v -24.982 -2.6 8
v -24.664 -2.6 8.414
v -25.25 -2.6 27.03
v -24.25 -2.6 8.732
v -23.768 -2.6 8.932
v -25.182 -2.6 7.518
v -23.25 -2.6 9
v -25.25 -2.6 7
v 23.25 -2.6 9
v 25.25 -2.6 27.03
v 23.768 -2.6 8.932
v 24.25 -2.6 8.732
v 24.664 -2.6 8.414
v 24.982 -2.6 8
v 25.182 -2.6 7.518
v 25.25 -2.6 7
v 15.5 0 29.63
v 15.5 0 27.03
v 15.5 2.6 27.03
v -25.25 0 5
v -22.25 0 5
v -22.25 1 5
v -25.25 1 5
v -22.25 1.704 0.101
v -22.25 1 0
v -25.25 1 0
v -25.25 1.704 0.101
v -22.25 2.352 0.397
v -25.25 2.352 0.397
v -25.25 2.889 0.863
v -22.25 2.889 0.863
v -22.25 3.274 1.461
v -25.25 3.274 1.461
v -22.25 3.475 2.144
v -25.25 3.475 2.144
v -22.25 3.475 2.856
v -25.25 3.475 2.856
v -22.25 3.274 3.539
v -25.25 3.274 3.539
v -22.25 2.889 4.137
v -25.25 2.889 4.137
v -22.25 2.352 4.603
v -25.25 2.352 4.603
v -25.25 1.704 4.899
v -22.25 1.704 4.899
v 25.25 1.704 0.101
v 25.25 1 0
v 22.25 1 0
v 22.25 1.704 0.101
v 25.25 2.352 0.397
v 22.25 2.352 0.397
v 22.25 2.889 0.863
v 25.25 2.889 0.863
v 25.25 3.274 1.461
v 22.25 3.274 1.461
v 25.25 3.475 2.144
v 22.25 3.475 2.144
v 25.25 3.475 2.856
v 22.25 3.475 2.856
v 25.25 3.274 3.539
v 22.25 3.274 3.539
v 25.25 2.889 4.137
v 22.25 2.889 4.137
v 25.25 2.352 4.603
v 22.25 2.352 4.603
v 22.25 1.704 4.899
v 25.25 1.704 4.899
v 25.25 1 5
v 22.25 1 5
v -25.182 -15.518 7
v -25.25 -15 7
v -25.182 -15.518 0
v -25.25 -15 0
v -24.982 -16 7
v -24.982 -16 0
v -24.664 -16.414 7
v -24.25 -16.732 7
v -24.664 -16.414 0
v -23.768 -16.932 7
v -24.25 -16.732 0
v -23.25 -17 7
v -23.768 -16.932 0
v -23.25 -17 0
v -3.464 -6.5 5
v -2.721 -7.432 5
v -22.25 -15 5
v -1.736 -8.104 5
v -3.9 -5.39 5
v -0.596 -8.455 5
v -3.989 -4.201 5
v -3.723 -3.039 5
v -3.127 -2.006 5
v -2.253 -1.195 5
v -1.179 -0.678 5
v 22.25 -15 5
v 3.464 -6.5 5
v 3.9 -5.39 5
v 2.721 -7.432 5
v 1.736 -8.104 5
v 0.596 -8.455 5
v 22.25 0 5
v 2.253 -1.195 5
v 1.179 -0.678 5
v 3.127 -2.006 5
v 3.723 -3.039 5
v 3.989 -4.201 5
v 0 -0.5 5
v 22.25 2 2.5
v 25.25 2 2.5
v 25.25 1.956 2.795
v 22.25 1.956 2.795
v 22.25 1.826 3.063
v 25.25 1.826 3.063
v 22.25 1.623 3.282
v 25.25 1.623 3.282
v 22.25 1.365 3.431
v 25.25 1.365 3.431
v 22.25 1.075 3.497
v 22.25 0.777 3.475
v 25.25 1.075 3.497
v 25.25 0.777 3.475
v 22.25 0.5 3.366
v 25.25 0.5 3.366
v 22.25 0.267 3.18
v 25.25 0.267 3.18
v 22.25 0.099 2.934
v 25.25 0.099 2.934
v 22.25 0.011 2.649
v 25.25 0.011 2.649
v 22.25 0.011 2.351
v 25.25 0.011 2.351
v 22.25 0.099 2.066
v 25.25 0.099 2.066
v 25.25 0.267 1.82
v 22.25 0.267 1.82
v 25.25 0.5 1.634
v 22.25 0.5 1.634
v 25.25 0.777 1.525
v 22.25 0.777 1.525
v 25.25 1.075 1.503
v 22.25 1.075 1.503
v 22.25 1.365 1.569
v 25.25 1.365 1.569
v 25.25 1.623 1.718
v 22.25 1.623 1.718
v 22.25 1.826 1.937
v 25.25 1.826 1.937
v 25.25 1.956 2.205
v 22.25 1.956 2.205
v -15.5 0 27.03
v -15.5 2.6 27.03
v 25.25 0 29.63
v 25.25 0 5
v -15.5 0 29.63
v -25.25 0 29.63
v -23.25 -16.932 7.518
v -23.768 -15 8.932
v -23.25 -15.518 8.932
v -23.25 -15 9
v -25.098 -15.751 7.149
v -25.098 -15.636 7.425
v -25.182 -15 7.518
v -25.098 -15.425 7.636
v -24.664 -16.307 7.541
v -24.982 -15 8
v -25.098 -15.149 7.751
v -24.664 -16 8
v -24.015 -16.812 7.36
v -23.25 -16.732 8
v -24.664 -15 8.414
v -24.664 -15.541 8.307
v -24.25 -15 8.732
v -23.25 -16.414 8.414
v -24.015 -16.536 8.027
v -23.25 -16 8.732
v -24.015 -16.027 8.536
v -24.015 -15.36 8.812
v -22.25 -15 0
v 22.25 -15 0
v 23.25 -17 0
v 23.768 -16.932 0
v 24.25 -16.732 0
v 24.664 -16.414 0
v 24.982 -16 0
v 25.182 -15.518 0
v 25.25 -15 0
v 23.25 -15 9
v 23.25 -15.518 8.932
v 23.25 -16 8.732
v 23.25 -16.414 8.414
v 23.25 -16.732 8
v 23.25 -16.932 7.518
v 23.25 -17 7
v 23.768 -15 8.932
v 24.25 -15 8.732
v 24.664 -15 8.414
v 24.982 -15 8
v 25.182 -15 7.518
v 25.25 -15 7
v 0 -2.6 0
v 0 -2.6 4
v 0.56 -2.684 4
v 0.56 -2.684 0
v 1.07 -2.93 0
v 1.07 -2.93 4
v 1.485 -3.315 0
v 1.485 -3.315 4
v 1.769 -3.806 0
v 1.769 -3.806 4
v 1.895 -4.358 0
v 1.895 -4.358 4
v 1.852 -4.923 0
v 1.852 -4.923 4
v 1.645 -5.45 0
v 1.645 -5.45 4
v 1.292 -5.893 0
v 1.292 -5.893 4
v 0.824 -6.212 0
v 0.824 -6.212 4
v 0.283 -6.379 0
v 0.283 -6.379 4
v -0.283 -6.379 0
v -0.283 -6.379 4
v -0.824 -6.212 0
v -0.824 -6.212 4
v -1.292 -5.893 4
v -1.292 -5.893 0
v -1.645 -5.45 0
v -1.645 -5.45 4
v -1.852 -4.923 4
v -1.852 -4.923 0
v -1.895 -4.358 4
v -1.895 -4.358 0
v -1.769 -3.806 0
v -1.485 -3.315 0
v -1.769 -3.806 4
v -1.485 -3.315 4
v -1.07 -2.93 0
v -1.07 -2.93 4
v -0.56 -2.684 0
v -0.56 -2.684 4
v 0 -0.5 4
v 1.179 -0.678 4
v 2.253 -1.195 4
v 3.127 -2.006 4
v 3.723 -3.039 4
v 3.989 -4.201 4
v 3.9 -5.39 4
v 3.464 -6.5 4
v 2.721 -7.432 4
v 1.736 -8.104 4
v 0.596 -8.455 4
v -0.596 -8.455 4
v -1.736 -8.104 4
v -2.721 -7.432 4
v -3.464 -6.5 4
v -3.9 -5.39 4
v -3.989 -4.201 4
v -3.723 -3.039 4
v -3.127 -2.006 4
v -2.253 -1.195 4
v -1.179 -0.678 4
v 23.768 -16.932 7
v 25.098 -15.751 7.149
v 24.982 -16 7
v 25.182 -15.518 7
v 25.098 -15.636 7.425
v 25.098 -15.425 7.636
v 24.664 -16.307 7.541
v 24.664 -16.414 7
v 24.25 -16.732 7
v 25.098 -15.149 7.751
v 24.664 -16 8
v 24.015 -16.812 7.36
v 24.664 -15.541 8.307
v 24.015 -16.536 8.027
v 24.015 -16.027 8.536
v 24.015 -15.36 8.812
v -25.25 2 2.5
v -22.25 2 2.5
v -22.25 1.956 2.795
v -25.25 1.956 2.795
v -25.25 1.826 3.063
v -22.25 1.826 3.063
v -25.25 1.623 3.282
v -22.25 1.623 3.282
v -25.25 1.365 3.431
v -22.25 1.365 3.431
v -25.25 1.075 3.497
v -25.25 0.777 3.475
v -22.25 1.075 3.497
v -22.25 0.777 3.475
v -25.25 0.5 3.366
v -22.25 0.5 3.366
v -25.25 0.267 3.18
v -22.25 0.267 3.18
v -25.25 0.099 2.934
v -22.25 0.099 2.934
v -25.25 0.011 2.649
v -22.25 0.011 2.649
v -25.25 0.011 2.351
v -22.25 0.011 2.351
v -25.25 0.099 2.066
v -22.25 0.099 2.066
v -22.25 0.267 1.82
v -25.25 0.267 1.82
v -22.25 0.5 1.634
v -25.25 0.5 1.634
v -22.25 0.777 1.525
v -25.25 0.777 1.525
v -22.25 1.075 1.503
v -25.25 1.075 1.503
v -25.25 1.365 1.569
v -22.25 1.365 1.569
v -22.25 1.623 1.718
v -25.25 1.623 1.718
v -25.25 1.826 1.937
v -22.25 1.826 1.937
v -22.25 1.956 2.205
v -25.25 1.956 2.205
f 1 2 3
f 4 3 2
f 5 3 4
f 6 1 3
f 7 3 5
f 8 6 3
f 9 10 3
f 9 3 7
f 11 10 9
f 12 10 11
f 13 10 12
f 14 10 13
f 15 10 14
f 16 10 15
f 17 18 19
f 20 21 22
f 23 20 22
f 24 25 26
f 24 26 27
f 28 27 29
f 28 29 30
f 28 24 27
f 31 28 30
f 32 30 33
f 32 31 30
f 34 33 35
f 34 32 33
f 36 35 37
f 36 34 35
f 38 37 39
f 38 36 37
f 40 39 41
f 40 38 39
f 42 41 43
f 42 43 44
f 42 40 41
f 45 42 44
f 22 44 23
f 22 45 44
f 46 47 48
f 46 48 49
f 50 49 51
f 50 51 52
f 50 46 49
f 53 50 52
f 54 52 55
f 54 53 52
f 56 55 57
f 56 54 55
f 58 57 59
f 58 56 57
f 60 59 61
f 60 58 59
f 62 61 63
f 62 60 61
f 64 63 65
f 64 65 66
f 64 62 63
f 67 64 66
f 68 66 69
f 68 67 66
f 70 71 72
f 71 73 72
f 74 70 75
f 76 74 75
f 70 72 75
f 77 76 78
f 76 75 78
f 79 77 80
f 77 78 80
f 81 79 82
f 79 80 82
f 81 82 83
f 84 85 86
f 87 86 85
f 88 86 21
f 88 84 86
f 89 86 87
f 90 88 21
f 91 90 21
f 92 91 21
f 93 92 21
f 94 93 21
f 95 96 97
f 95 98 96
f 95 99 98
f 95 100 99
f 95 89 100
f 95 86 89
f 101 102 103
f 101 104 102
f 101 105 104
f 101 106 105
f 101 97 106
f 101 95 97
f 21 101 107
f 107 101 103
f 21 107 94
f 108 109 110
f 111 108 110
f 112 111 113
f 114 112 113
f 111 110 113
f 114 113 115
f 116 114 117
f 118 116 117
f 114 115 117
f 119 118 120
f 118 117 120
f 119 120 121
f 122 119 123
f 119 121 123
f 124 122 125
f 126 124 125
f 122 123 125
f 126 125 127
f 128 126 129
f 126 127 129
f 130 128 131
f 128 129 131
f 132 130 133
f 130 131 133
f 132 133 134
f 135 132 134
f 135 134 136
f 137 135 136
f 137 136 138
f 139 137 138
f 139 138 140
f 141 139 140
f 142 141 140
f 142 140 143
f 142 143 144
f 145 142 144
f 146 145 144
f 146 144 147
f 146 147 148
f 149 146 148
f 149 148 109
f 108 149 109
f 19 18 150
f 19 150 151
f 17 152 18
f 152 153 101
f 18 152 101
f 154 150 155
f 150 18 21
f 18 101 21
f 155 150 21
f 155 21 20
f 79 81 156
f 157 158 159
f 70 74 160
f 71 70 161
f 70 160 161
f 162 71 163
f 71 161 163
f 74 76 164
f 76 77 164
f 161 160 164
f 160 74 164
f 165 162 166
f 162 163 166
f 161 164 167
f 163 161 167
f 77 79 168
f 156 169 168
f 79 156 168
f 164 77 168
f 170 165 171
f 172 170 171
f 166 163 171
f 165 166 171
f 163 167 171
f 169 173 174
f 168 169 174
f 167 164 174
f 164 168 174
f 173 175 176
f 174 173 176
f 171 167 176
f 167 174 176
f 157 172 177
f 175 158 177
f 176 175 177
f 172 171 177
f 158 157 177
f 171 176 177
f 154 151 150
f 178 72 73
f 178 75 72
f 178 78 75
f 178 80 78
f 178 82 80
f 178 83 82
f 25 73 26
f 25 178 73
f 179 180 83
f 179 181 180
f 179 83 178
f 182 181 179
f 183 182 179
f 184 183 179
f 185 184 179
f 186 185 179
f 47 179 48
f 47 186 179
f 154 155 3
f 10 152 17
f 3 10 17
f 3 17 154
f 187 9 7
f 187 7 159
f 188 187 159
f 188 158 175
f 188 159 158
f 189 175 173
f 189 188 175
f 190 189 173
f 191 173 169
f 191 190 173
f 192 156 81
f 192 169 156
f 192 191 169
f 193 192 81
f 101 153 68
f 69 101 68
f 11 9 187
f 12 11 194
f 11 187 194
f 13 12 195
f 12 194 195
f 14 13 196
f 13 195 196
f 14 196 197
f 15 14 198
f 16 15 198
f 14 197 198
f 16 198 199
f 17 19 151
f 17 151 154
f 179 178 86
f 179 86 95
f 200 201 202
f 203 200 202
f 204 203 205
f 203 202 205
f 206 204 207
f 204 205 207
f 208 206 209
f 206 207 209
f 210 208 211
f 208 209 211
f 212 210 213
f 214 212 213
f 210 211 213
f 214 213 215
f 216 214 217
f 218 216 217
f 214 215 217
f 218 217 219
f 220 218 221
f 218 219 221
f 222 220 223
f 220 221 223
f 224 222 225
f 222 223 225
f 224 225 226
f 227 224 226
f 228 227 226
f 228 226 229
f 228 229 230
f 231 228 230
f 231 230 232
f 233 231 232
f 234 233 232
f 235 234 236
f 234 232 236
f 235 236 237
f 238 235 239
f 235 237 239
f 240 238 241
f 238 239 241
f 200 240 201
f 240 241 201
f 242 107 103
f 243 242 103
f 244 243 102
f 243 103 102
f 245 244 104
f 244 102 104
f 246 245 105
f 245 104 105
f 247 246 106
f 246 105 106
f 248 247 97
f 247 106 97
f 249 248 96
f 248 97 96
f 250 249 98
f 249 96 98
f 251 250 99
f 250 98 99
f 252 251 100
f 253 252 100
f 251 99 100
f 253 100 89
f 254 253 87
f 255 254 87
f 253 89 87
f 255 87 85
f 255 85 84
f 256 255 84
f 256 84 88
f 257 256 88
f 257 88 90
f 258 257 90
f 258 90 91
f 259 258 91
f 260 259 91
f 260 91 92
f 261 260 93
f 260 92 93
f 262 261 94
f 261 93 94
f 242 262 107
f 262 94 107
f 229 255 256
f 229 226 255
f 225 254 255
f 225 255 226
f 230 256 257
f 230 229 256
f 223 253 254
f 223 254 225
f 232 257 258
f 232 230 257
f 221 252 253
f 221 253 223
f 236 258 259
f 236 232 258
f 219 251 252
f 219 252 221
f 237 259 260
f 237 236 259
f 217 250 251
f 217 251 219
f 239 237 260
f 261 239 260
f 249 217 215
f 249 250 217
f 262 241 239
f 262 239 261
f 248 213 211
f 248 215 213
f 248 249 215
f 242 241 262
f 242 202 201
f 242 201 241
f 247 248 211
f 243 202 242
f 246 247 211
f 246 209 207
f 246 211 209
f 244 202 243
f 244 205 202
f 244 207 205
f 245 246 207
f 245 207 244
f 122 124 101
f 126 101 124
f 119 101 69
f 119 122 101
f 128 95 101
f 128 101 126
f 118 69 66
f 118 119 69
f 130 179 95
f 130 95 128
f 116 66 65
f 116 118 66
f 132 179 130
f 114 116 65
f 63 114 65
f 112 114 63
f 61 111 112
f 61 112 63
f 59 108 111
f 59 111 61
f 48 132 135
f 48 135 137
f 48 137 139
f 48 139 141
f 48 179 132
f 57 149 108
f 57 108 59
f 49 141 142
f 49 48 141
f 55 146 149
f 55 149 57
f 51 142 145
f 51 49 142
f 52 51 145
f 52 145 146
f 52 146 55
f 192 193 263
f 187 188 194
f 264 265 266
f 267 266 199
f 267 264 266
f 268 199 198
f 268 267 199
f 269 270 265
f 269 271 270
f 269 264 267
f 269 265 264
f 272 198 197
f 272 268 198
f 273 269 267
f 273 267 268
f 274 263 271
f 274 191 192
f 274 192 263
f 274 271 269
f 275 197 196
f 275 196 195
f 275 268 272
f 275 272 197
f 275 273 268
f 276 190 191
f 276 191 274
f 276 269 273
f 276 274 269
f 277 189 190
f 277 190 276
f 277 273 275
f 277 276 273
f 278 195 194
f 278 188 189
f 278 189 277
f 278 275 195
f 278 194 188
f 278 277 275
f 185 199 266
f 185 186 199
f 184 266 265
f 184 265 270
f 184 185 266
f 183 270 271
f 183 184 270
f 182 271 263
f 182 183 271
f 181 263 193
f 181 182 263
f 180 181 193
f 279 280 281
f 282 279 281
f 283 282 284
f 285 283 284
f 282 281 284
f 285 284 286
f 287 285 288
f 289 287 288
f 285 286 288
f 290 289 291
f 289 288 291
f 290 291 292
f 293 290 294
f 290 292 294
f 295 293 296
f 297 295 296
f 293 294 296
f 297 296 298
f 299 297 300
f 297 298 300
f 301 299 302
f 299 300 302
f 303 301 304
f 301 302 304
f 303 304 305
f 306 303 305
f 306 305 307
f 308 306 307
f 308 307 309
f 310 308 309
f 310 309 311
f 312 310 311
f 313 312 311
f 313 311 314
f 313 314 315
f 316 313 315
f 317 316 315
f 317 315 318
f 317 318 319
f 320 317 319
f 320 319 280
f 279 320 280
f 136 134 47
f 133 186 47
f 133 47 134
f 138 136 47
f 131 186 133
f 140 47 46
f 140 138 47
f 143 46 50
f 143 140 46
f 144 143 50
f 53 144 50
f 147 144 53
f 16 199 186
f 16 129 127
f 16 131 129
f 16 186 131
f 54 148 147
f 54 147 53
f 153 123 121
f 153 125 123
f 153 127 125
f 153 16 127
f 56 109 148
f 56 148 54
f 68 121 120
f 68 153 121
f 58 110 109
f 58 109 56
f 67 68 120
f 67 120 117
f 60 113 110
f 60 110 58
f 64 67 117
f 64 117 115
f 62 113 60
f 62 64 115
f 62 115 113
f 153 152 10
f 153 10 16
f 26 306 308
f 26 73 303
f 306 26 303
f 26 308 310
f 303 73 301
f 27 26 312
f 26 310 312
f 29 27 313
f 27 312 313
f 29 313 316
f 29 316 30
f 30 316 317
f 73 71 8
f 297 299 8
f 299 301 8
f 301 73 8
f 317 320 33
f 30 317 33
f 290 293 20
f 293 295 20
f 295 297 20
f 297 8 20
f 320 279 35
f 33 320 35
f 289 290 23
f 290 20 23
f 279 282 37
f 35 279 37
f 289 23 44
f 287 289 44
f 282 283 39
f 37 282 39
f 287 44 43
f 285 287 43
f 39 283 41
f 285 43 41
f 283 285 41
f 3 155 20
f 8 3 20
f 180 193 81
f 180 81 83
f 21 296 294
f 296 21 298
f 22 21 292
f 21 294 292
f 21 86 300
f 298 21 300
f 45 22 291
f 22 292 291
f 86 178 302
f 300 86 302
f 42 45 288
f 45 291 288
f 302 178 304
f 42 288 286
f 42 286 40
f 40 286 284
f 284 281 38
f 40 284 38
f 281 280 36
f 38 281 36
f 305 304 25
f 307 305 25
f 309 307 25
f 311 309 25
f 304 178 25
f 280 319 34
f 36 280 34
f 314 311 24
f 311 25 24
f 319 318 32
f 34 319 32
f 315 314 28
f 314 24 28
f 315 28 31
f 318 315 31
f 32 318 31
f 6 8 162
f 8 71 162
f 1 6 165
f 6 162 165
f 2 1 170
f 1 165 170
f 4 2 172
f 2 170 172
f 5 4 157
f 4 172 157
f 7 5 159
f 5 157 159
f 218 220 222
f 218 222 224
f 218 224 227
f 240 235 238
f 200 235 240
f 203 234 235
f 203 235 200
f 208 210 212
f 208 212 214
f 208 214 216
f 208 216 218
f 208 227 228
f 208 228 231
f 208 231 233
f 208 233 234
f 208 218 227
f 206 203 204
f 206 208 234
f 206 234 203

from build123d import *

# Parameters (mm, degrees)
PAD003_DEPTH    = 25.25
SKETCH008_W     = 25
SKETCH008_H     = 44.5
POCKET_DEPTH    = 5
SKETCH009_R     = 4
PAD004_DEPTH    = 1
SKETCH010_R     = 1.9
PAD005_DEPTH    = 4
POCKET001_DEPTH = 5
SKETCH012_R     = 1
POCKET002_DEPTH = 50.501
FILLET_R        = 2


with BuildPart() as part:
    # Sketch003 → Pad003 (new body, symmetric)
    with BuildSketch(Plane.YZ):
        with BuildLine():
            Line((-2.6, 27.03), (-2.6, 9))
            Line((-2.6, 9), (-17, 9))
            Line((-17, 9), (-17, 0))
            Line((-17, 0), (1, 0))
            ThreePointArc((1, 0), (3.5, 2.5), (1, 5))
            Line((0, 5), (1, 5))
            Line((0, 5), (0, 27.03))
            Line((0, 27.03), (2.6, 27.03))
            Line((2.6, 27.03), (0, 29.63))
            Line((0, 29.63), (-2.6, 27.03))
        make_face()
    extrude(amount=PAD003_DEPTH, both=True)

    # Sketch008 (on Face8 of Pad003) → Pocket (cut)
    with BuildSketch(Plane.YX):
        with Locations((-2.5, 0)):
            Rectangle(SKETCH008_W, SKETCH008_H)
    extrude(amount=-POCKET_DEPTH, mode=Mode.SUBTRACT)

    # Sketch009 (on Face3 of Pocket) → Pad004 (join)
    with BuildSketch(Plane.YX.offset(-5)):
        with Locations((-4.5, 0)):
            Circle(SKETCH009_R)
    extrude(amount=PAD004_DEPTH)

    # Sketch010 (on Face20 of Pad004) → Pad005 (join)
    with BuildSketch(Plane.YX.offset(-4)):
        with Locations((-4.5, 0)):
            Circle(SKETCH010_R)
    extrude(amount=PAD005_DEPTH)

    # Sketch011 (on Face5 of Pad005) → Pocket001 (cut)
    with BuildSketch(Plane.YX.offset(-27.03)):
        Polygon((0, 15.5), (5, 15.5), (5, -15.5), (0, -15.5), (0, -30), (22, -30), (22, 30), (0, 30), align=None)
    extrude(amount=-POCKET001_DEPTH, mode=Mode.SUBTRACT)

    # Sketch012 (on Face9 of Pocket001) → Pocket002 (cut, through all)
    with BuildSketch(Plane.YZ.offset(25.25)):
        with Locations((1, 2.5)):
            Circle(SKETCH012_R)
    extrude(amount=-POCKET002_DEPTH, mode=Mode.SUBTRACT)

    # Fillet
    fillet_edges = [part.edges().sort_by_distance(p)[0] for p in [
        (0, -17, 9),
        (25.25, -17, 4.5),
        (25.25, -9.8, 9),
        (-25.25, -17, 4.5),
        (-25.25, -9.8, 9),
    ]]
    fillet(fillet_edges, radius=FILLET_R)


solid = part.part
